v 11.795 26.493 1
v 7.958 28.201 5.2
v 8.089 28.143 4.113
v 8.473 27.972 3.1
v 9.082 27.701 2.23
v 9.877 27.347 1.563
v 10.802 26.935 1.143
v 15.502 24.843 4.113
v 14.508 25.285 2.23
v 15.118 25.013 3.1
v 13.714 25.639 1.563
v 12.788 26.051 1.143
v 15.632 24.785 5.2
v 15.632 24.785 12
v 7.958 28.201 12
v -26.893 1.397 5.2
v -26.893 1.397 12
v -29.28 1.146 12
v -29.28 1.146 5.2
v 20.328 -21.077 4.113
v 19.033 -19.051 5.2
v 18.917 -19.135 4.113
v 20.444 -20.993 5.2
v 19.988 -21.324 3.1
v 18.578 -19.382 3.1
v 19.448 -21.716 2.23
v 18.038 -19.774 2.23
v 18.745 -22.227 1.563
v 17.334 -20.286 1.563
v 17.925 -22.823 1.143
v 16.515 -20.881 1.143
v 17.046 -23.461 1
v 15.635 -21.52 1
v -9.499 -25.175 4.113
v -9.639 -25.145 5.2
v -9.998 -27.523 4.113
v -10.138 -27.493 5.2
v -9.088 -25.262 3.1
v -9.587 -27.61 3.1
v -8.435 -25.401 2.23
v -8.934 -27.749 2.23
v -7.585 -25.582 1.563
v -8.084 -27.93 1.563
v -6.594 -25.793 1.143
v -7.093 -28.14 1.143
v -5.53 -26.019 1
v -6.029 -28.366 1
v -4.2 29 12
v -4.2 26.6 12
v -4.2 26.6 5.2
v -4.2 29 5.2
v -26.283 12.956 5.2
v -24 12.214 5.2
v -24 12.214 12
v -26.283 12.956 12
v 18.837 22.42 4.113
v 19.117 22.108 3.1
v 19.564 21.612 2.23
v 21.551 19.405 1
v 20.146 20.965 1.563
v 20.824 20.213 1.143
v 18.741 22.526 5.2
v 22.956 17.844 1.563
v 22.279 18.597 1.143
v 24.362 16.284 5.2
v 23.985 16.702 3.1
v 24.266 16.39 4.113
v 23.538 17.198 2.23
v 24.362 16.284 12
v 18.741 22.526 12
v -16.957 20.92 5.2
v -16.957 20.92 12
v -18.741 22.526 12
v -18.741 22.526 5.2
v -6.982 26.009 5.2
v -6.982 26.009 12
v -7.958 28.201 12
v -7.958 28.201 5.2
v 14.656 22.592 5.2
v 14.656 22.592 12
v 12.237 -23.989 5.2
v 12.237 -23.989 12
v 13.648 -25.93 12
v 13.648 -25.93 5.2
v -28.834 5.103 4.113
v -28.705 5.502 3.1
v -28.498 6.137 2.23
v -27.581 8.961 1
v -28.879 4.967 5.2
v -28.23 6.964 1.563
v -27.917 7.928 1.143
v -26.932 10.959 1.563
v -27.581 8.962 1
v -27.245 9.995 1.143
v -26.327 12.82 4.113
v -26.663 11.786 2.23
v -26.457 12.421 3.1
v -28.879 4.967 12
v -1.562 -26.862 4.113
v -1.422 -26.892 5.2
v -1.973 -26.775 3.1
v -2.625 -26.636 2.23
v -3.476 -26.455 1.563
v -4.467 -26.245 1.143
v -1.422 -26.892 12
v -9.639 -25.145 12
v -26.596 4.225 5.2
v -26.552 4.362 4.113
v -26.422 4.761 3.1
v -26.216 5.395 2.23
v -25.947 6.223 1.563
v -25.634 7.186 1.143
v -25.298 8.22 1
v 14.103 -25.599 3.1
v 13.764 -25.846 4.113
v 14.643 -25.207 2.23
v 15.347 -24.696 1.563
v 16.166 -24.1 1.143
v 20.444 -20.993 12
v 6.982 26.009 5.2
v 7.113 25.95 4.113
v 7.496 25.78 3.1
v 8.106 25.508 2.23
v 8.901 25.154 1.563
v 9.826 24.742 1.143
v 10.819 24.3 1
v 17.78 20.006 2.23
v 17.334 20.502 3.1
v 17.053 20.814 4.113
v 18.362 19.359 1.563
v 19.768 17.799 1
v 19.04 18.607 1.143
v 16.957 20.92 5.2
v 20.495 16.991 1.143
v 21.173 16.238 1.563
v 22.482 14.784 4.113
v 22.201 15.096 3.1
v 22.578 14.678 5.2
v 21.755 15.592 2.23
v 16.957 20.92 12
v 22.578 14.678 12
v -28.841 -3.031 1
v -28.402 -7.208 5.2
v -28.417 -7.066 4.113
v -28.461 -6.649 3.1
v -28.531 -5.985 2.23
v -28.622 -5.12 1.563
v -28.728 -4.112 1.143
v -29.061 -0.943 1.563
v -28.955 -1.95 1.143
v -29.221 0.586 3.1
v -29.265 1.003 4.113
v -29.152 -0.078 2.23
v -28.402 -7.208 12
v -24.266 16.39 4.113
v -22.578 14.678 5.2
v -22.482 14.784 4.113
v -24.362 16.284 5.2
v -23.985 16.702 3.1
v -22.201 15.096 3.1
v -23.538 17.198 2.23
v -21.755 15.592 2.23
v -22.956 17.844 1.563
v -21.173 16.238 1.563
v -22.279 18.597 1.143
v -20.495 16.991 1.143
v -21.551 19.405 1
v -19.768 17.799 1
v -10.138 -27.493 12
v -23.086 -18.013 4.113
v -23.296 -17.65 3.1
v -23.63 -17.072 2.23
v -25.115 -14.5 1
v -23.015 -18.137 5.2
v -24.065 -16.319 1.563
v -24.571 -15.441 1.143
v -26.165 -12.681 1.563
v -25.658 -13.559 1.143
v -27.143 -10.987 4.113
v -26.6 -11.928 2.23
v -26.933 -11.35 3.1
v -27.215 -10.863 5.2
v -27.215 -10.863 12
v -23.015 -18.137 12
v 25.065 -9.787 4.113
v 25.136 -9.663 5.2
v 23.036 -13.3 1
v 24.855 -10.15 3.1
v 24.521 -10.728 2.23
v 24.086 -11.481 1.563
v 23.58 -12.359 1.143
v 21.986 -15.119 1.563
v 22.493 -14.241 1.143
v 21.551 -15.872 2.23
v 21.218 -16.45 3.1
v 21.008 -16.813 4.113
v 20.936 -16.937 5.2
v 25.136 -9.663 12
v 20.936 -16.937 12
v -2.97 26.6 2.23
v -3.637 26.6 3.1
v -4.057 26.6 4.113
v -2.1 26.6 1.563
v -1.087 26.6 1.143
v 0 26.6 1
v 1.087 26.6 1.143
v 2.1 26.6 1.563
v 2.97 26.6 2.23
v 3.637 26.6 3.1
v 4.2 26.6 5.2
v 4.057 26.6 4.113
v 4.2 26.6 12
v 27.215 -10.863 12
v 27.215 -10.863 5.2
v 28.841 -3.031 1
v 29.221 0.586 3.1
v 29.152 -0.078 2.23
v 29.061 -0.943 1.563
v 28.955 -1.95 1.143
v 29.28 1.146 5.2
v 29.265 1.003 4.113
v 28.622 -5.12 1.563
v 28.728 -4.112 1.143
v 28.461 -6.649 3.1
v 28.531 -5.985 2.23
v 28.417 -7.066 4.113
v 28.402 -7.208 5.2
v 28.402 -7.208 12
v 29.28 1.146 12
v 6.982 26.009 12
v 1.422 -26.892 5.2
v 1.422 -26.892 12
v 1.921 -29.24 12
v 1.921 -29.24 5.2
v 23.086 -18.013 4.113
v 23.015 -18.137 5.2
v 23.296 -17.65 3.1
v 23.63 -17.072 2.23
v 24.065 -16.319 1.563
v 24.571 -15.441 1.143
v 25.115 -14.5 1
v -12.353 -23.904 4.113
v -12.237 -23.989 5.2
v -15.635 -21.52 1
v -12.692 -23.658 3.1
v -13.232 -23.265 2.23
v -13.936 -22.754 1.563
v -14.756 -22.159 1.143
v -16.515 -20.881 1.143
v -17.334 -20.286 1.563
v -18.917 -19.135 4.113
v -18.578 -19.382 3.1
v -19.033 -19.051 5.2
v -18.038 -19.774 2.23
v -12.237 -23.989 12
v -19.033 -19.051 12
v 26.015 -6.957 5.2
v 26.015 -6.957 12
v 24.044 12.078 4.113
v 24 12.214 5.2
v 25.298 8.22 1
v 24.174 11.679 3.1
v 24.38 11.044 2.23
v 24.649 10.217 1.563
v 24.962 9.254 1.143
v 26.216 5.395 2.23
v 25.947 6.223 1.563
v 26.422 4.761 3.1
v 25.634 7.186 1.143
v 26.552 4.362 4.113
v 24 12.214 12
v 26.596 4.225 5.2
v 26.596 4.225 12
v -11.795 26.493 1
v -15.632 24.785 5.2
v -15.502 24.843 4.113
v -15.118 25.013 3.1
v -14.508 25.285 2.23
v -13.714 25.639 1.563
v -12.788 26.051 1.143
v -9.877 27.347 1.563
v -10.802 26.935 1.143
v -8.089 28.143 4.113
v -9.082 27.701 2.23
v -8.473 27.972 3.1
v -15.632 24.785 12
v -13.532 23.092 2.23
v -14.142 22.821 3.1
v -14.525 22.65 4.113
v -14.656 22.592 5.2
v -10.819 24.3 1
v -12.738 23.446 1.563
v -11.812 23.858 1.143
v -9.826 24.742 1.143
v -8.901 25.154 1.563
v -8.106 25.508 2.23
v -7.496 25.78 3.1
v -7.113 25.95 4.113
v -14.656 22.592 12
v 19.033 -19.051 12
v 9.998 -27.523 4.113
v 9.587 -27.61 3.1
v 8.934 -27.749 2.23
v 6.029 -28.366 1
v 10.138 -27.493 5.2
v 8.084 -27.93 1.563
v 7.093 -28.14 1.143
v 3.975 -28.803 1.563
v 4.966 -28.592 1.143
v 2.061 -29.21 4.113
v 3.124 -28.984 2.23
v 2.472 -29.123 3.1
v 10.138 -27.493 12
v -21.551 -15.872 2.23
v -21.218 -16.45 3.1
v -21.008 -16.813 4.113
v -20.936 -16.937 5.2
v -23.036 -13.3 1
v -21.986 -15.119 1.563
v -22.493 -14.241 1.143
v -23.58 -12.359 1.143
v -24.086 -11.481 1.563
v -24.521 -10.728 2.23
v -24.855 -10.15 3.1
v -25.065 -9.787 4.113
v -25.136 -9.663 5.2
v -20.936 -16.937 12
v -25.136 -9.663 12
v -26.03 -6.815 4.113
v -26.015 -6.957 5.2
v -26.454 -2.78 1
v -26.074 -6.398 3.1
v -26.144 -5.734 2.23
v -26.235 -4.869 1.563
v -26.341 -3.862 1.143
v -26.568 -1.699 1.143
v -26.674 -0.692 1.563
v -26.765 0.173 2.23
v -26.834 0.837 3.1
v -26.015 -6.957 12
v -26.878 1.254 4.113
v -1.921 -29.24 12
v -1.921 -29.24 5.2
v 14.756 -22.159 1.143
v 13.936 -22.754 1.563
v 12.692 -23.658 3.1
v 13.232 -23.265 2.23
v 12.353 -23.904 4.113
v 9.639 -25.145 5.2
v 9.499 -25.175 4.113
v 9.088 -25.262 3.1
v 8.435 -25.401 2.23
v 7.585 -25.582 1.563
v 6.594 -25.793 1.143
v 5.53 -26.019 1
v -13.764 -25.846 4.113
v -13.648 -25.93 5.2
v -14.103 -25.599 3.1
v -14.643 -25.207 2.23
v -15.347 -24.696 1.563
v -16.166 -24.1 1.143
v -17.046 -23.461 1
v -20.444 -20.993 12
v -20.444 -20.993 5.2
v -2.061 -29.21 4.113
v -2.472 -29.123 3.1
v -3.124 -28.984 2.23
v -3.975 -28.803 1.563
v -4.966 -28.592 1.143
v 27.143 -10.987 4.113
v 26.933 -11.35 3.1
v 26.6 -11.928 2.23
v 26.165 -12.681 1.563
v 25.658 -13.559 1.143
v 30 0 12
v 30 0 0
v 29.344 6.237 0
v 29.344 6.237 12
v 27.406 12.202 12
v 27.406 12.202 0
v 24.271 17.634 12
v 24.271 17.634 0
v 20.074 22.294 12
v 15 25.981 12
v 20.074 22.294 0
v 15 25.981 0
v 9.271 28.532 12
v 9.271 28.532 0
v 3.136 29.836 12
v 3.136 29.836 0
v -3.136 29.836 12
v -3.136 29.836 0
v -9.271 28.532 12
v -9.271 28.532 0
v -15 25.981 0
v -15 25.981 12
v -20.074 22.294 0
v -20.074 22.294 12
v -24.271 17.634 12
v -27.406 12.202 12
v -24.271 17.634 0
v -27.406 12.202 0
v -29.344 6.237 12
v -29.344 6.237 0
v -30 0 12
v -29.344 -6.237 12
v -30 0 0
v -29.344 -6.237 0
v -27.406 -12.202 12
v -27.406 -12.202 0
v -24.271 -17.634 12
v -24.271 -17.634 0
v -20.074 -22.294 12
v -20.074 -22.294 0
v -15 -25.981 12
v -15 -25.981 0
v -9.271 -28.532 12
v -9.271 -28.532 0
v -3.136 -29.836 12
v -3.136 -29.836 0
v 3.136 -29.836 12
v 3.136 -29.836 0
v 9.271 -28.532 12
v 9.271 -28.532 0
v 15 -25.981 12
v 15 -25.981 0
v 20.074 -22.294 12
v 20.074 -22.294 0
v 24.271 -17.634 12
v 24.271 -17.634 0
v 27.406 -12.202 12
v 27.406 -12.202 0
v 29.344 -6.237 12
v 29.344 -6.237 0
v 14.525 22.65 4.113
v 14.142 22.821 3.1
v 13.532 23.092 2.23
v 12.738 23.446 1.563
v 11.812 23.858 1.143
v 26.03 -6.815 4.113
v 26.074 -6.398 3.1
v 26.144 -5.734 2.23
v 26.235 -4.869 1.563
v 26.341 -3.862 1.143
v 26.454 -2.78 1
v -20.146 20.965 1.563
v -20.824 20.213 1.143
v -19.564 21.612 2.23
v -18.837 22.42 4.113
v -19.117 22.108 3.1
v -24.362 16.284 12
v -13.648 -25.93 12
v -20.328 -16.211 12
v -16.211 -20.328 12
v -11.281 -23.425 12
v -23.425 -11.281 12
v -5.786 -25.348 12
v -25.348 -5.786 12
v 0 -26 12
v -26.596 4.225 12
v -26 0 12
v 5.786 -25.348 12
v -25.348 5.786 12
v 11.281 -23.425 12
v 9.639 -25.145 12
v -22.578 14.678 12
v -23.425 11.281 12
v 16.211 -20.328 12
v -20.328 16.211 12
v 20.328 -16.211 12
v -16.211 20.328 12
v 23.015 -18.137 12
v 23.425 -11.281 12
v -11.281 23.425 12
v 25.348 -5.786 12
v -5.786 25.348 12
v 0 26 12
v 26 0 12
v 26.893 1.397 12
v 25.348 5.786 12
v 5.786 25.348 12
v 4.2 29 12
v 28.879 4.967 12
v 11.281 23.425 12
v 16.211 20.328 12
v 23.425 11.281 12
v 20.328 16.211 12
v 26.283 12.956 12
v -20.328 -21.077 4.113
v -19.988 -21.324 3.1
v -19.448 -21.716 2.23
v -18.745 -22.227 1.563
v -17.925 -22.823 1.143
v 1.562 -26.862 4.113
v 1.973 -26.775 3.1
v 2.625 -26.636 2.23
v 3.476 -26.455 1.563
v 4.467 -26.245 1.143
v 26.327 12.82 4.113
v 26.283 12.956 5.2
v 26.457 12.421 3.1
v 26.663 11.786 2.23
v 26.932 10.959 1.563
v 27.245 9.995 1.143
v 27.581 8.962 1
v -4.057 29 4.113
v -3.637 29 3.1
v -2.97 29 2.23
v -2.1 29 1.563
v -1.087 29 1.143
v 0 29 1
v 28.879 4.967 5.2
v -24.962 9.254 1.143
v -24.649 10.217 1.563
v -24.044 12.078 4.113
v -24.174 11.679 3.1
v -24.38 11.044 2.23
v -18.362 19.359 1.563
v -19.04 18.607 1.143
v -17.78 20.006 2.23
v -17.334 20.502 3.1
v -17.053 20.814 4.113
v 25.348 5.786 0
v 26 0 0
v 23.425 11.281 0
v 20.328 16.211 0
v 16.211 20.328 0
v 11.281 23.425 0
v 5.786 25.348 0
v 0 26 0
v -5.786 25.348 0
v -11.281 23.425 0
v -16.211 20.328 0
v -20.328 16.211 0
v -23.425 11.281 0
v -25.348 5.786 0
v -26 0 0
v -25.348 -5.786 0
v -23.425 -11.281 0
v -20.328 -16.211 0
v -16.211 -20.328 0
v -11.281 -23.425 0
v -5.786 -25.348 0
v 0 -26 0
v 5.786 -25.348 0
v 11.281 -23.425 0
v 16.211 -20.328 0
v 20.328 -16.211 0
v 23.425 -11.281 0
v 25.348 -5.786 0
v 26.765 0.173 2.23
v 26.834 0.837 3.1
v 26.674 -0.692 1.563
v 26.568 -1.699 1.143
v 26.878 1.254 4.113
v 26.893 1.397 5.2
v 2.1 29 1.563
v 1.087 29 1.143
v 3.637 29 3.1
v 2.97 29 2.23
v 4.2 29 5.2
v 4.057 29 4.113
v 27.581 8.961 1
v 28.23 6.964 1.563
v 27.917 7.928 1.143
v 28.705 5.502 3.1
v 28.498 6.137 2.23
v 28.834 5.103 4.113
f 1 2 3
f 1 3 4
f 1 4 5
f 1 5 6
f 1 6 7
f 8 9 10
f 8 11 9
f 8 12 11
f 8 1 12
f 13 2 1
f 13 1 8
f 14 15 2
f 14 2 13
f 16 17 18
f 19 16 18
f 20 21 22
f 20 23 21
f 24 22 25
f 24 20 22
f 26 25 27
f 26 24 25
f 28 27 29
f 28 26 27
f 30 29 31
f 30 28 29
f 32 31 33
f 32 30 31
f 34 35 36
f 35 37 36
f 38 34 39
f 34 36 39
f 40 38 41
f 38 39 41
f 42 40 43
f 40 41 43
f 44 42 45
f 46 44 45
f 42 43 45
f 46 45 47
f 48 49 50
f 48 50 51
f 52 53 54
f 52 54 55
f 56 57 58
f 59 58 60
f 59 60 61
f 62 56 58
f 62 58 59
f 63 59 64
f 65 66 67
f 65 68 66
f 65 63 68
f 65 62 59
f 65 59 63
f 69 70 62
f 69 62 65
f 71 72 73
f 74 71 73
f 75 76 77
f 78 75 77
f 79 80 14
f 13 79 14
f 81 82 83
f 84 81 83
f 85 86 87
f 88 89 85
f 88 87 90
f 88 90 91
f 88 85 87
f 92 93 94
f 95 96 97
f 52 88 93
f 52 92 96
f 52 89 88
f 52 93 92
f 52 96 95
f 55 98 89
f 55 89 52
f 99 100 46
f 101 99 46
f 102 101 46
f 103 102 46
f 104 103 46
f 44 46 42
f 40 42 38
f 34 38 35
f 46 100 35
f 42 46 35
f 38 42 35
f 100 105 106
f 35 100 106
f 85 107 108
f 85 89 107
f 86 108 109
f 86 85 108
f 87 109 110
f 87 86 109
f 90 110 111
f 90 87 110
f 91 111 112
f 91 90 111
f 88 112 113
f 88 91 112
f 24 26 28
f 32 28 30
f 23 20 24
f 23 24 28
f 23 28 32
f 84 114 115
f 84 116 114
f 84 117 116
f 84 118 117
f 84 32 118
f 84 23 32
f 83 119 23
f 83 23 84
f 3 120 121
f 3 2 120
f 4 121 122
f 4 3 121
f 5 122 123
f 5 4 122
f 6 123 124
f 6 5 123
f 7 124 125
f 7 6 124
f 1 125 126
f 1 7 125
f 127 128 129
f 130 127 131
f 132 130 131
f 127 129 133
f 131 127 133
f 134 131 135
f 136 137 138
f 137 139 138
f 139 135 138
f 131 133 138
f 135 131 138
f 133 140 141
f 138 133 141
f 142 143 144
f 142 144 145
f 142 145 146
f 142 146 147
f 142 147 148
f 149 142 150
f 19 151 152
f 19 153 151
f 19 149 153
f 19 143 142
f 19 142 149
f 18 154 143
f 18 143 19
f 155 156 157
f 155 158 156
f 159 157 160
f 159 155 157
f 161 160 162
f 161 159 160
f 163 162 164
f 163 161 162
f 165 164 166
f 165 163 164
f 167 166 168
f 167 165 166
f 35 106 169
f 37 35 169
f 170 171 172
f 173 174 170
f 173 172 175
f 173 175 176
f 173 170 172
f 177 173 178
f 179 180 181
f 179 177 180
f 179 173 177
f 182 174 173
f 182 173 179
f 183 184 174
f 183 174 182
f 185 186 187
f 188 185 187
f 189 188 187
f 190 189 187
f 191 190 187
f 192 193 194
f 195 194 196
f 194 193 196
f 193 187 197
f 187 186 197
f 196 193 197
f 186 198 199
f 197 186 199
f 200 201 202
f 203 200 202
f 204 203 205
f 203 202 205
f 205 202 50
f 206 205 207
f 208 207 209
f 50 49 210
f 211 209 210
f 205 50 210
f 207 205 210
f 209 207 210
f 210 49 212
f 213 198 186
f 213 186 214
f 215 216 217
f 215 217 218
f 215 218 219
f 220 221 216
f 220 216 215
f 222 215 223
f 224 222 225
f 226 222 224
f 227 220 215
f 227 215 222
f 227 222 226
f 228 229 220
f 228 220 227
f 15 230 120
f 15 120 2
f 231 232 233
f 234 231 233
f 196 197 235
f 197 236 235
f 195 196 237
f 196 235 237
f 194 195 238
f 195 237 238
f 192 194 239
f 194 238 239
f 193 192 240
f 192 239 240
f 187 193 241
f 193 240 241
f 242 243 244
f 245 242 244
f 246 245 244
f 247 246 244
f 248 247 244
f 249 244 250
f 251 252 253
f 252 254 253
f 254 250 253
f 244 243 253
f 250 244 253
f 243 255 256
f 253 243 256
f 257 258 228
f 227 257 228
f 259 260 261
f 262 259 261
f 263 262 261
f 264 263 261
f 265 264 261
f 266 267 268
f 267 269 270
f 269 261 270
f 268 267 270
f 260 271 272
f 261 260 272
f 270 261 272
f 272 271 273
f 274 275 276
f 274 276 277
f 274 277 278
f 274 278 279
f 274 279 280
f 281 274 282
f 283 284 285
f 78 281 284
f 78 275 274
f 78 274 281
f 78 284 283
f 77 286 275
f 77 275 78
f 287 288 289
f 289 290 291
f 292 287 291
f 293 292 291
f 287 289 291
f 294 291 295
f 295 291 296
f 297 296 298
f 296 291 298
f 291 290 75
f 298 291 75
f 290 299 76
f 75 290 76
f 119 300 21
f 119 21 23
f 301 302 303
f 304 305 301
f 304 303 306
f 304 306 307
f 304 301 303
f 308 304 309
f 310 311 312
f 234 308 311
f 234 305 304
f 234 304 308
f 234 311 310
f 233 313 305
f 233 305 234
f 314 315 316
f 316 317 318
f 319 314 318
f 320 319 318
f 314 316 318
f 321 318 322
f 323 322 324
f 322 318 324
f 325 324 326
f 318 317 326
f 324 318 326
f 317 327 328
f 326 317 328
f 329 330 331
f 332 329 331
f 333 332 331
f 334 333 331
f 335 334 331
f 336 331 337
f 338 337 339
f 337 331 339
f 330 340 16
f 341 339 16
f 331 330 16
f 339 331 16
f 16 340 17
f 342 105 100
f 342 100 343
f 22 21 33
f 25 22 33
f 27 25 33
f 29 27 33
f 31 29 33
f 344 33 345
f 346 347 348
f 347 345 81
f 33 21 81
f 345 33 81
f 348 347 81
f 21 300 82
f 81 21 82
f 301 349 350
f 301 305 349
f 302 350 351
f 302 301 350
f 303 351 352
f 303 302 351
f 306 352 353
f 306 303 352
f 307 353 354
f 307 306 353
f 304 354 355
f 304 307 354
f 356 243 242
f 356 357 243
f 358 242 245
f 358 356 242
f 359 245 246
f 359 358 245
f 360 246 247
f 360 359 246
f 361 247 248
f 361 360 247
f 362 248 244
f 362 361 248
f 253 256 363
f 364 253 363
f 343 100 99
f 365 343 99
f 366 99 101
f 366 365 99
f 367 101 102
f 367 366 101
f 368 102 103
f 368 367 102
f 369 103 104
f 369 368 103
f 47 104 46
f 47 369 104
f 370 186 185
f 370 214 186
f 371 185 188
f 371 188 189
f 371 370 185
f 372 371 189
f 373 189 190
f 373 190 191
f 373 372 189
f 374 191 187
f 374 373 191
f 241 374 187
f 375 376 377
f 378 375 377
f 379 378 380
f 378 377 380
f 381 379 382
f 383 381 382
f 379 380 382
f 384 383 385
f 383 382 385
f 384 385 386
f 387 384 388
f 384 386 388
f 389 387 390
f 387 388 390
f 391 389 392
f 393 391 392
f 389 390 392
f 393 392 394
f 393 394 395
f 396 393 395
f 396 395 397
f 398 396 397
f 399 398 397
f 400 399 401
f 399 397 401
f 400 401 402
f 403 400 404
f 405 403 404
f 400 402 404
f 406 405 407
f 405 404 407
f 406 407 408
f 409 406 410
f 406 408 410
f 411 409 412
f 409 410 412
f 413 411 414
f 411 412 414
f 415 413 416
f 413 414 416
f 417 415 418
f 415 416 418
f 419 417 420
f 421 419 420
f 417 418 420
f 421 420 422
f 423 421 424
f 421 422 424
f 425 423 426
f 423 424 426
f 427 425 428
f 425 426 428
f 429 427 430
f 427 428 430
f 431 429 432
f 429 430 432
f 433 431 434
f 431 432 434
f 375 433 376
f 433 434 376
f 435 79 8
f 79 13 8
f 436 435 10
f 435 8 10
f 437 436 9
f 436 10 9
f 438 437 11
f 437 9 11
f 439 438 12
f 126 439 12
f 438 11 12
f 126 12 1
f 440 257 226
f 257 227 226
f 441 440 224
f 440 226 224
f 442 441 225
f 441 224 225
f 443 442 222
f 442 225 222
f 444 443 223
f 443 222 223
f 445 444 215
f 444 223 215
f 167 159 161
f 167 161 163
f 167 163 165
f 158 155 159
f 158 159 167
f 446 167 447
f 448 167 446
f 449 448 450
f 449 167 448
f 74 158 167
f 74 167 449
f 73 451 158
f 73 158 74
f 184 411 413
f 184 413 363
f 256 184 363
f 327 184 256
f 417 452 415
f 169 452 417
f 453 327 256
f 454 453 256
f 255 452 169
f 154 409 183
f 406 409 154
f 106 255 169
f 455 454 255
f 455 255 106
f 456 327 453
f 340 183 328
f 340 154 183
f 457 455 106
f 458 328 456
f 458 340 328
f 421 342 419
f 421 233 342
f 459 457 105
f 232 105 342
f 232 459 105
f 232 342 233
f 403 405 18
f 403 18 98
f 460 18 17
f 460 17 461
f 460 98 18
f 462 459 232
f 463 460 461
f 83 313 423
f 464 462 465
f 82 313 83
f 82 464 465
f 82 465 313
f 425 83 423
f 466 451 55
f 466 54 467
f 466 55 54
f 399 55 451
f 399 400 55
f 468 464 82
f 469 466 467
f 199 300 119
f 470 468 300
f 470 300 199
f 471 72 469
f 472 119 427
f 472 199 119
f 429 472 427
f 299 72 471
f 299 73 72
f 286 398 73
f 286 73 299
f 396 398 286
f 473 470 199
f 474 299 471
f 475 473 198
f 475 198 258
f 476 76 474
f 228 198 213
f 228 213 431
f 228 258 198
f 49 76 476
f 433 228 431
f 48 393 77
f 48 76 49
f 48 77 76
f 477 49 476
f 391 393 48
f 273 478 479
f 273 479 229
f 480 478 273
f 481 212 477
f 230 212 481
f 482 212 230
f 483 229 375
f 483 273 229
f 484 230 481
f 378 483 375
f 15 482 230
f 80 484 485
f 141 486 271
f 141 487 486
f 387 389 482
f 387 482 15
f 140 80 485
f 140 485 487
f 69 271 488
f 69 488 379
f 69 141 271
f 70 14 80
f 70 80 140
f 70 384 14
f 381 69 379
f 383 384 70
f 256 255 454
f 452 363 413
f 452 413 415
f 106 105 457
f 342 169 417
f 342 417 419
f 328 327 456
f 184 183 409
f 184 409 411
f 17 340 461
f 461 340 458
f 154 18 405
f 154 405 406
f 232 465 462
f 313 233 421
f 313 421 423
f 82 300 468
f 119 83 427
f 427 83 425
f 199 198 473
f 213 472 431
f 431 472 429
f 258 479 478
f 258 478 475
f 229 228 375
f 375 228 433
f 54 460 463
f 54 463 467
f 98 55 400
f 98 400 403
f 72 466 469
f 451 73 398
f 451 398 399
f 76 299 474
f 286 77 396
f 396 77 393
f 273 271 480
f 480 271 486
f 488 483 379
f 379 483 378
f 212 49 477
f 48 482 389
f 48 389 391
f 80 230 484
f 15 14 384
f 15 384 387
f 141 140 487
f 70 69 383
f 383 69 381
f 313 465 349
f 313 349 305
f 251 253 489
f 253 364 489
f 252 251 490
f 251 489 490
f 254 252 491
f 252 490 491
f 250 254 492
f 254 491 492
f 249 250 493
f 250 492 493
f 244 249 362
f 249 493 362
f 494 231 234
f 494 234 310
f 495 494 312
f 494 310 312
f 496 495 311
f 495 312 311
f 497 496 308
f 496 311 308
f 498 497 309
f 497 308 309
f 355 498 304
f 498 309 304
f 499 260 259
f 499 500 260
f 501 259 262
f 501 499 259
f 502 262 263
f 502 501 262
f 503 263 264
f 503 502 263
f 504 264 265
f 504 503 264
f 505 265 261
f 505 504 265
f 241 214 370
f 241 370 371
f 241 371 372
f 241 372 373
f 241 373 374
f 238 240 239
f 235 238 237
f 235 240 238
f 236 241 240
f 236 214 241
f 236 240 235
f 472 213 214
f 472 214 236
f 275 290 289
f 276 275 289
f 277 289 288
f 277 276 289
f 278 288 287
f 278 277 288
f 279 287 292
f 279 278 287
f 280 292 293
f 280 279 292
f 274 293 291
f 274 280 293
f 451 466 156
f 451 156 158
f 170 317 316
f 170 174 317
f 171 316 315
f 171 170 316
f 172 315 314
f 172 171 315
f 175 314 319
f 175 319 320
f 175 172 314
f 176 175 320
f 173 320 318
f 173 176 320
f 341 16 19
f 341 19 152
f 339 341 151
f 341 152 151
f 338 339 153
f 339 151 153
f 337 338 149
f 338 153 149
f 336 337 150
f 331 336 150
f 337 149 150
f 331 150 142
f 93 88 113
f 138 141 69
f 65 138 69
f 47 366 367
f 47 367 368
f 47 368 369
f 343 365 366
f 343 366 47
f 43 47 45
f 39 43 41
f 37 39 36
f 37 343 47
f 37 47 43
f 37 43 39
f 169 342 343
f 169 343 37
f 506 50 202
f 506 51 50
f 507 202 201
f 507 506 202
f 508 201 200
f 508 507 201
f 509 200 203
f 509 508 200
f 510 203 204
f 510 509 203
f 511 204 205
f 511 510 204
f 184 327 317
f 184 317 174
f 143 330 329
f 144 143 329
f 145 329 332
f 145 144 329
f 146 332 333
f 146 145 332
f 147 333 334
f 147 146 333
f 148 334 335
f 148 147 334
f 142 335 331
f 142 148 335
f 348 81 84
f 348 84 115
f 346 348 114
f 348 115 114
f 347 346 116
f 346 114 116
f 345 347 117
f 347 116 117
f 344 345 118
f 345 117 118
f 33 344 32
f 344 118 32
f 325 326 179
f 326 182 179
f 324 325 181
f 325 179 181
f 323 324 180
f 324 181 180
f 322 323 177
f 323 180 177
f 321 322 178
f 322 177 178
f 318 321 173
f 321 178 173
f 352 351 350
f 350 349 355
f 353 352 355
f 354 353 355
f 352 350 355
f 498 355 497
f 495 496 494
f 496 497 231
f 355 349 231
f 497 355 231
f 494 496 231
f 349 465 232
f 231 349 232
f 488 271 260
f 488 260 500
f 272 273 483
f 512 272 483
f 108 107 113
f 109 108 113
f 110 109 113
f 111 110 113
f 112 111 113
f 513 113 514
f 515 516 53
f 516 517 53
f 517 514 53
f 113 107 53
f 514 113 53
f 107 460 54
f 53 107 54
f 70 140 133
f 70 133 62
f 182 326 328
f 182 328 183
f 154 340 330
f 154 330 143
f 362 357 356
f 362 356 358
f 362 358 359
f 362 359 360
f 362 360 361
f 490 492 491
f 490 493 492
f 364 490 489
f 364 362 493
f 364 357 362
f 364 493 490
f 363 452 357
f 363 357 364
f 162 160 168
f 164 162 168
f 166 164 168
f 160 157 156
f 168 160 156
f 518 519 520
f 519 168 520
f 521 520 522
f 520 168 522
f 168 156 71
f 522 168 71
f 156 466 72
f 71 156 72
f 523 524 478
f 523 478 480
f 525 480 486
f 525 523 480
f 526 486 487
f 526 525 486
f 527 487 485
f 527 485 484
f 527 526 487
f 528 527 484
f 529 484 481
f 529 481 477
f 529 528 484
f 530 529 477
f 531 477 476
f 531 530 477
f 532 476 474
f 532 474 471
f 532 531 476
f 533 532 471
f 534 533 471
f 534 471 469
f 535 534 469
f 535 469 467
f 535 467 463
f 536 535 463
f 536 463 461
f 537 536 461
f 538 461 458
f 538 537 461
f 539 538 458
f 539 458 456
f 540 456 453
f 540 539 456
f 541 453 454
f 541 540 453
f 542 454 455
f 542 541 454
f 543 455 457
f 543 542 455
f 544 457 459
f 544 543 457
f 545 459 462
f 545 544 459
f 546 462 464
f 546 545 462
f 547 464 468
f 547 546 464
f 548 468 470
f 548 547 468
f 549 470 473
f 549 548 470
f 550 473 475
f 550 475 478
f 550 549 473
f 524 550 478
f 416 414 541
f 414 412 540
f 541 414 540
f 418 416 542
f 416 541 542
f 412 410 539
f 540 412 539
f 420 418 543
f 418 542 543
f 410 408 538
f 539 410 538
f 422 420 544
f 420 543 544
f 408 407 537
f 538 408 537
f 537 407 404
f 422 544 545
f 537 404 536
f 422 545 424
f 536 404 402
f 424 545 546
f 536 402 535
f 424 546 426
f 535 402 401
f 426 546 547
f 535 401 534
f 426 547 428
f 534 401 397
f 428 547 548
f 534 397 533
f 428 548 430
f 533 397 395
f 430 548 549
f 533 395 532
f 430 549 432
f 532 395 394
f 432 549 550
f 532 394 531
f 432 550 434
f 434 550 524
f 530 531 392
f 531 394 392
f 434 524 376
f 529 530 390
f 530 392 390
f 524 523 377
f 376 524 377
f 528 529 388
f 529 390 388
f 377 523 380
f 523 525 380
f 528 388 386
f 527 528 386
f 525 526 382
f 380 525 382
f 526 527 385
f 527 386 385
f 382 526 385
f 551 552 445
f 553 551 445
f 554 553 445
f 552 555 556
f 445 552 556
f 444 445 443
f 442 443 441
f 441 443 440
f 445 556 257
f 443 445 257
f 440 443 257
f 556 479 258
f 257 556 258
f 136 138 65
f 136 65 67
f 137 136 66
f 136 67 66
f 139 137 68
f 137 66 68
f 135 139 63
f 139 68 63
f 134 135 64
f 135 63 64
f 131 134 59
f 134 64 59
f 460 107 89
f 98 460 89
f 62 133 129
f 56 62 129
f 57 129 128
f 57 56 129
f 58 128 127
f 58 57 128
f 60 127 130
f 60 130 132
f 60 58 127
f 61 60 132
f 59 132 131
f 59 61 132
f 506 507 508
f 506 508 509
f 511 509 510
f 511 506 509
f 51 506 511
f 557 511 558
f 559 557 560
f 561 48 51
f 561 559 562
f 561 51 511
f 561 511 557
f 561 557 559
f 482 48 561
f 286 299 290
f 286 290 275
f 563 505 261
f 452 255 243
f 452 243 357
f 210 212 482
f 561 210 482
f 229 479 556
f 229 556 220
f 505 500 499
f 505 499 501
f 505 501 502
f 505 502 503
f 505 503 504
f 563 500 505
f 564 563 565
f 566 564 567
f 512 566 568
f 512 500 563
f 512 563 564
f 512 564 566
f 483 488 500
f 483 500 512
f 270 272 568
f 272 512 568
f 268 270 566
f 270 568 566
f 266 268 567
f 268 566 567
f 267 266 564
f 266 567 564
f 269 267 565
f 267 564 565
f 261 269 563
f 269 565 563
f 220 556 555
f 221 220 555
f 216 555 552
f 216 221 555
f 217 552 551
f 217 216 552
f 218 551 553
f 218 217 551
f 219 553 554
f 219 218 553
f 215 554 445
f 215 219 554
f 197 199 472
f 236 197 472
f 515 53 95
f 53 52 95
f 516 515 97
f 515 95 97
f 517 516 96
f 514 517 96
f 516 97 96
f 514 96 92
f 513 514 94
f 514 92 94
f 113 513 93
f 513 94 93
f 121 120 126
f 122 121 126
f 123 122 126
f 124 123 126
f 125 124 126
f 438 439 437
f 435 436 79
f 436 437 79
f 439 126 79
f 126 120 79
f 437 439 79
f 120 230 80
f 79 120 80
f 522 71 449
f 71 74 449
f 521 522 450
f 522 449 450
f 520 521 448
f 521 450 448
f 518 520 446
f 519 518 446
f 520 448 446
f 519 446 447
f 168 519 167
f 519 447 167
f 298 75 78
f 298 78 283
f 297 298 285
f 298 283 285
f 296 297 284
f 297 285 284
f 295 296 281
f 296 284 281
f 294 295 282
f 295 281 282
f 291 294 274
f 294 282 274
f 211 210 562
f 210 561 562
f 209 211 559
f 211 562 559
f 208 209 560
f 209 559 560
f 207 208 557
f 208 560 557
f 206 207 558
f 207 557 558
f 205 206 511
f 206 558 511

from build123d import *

# Parameters (mm, degrees)
F0_R            = 30
F0_R_2          = 26
F1_DEPTH        = 12
F2_W            = 8.4
F2_H            = 2.4
F3_DEPTH        = 11
F3_COPIES_COUNT = 15
F4_R            = 4.19999


# Not quite as in the source:
# - a fillet or chamfer is up to 0.001 mm smaller than in the source, because OpenCascade refuses the exact size
# - a pattern or mirror of a feature is missing from the dataset's text; its kind, count and spacing are read off the source's solid


with BuildPart() as f1:
    # F0 (on Top) → F1 (new body)
    with BuildSketch(Plane.XY):
        Circle(F0_R)
        Circle(F0_R_2, mode=Mode.SUBTRACT)
    extrude(amount=F1_DEPTH)

    # F2 (on face) → F3 (cut)
    with BuildSketch(Plane.XY.offset(12)):
        with Locations((0, 27.8)):
            Rectangle(F2_W, F2_H)
    f3 = extrude(amount=-F3_DEPTH, mode=Mode.SUBTRACT)

    # F3_copies: F3 ×15 about axis
    f3_copies_axis = Axis((0, 0, 0), (0, 0, 1))
    for i in range(1, F3_COPIES_COUNT):
        add(f3.rotate(f3_copies_axis, i * 360 / F3_COPIES_COUNT), mode=Mode.SUBTRACT)

    # F4 (radius 4.2 in the source; OpenCascade refuses exactly that, so slightly less here)
    f4_edges = [f1.edges().sort_by_distance(p)[0] for p in [
        (-4.2, 27.8, 1),
        (4.2, 27.8, 1),
        (-12.942559, -24.959371, 1),
        (-19.738301, -20.021974, 1),
        (-1.671725, -28.065732, 1),
        (-9.888165, -26.319274, 1),
        (-21.975506, -17.537307, 1),
        (-26.175506, -10.262693, 1),
        (-27.208689, -7.082883, 1),
        (-28.086728, 1.271101, 1),
        (9.888165, -26.319274, 1),
        (1.671725, -28.065732, 1),
        (19.738301, -20.021974, 1),
        (12.942559, -24.959371, 1),
        (26.175506, -10.262693, 1),
        (21.975506, -17.537307, 1),
        (28.086728, 1.271101, 1),
        (27.208689, -7.082883, 1),
        (-27.737243, 4.596235, 1),
        (-25.1415, 12.58511, 1),
        (-23.469775, 15.480623, 1),
        (-17.849078, 21.723039, 1),
        (-15.14417, 23.68827, 1),
        (-7.470388, 27.104858, 1),
        (25.1415, 12.58511, 1),
        (27.737243, 4.596235, 1),
        (15.14417, 23.68827, 1),
        (7.470388, 27.104858, 1),
        (17.849078, 21.723039, 1),
        (23.469775, 15.480623, 1),
    ]]
    fillet(f4_edges, radius=F4_R)


solid = f1.part
